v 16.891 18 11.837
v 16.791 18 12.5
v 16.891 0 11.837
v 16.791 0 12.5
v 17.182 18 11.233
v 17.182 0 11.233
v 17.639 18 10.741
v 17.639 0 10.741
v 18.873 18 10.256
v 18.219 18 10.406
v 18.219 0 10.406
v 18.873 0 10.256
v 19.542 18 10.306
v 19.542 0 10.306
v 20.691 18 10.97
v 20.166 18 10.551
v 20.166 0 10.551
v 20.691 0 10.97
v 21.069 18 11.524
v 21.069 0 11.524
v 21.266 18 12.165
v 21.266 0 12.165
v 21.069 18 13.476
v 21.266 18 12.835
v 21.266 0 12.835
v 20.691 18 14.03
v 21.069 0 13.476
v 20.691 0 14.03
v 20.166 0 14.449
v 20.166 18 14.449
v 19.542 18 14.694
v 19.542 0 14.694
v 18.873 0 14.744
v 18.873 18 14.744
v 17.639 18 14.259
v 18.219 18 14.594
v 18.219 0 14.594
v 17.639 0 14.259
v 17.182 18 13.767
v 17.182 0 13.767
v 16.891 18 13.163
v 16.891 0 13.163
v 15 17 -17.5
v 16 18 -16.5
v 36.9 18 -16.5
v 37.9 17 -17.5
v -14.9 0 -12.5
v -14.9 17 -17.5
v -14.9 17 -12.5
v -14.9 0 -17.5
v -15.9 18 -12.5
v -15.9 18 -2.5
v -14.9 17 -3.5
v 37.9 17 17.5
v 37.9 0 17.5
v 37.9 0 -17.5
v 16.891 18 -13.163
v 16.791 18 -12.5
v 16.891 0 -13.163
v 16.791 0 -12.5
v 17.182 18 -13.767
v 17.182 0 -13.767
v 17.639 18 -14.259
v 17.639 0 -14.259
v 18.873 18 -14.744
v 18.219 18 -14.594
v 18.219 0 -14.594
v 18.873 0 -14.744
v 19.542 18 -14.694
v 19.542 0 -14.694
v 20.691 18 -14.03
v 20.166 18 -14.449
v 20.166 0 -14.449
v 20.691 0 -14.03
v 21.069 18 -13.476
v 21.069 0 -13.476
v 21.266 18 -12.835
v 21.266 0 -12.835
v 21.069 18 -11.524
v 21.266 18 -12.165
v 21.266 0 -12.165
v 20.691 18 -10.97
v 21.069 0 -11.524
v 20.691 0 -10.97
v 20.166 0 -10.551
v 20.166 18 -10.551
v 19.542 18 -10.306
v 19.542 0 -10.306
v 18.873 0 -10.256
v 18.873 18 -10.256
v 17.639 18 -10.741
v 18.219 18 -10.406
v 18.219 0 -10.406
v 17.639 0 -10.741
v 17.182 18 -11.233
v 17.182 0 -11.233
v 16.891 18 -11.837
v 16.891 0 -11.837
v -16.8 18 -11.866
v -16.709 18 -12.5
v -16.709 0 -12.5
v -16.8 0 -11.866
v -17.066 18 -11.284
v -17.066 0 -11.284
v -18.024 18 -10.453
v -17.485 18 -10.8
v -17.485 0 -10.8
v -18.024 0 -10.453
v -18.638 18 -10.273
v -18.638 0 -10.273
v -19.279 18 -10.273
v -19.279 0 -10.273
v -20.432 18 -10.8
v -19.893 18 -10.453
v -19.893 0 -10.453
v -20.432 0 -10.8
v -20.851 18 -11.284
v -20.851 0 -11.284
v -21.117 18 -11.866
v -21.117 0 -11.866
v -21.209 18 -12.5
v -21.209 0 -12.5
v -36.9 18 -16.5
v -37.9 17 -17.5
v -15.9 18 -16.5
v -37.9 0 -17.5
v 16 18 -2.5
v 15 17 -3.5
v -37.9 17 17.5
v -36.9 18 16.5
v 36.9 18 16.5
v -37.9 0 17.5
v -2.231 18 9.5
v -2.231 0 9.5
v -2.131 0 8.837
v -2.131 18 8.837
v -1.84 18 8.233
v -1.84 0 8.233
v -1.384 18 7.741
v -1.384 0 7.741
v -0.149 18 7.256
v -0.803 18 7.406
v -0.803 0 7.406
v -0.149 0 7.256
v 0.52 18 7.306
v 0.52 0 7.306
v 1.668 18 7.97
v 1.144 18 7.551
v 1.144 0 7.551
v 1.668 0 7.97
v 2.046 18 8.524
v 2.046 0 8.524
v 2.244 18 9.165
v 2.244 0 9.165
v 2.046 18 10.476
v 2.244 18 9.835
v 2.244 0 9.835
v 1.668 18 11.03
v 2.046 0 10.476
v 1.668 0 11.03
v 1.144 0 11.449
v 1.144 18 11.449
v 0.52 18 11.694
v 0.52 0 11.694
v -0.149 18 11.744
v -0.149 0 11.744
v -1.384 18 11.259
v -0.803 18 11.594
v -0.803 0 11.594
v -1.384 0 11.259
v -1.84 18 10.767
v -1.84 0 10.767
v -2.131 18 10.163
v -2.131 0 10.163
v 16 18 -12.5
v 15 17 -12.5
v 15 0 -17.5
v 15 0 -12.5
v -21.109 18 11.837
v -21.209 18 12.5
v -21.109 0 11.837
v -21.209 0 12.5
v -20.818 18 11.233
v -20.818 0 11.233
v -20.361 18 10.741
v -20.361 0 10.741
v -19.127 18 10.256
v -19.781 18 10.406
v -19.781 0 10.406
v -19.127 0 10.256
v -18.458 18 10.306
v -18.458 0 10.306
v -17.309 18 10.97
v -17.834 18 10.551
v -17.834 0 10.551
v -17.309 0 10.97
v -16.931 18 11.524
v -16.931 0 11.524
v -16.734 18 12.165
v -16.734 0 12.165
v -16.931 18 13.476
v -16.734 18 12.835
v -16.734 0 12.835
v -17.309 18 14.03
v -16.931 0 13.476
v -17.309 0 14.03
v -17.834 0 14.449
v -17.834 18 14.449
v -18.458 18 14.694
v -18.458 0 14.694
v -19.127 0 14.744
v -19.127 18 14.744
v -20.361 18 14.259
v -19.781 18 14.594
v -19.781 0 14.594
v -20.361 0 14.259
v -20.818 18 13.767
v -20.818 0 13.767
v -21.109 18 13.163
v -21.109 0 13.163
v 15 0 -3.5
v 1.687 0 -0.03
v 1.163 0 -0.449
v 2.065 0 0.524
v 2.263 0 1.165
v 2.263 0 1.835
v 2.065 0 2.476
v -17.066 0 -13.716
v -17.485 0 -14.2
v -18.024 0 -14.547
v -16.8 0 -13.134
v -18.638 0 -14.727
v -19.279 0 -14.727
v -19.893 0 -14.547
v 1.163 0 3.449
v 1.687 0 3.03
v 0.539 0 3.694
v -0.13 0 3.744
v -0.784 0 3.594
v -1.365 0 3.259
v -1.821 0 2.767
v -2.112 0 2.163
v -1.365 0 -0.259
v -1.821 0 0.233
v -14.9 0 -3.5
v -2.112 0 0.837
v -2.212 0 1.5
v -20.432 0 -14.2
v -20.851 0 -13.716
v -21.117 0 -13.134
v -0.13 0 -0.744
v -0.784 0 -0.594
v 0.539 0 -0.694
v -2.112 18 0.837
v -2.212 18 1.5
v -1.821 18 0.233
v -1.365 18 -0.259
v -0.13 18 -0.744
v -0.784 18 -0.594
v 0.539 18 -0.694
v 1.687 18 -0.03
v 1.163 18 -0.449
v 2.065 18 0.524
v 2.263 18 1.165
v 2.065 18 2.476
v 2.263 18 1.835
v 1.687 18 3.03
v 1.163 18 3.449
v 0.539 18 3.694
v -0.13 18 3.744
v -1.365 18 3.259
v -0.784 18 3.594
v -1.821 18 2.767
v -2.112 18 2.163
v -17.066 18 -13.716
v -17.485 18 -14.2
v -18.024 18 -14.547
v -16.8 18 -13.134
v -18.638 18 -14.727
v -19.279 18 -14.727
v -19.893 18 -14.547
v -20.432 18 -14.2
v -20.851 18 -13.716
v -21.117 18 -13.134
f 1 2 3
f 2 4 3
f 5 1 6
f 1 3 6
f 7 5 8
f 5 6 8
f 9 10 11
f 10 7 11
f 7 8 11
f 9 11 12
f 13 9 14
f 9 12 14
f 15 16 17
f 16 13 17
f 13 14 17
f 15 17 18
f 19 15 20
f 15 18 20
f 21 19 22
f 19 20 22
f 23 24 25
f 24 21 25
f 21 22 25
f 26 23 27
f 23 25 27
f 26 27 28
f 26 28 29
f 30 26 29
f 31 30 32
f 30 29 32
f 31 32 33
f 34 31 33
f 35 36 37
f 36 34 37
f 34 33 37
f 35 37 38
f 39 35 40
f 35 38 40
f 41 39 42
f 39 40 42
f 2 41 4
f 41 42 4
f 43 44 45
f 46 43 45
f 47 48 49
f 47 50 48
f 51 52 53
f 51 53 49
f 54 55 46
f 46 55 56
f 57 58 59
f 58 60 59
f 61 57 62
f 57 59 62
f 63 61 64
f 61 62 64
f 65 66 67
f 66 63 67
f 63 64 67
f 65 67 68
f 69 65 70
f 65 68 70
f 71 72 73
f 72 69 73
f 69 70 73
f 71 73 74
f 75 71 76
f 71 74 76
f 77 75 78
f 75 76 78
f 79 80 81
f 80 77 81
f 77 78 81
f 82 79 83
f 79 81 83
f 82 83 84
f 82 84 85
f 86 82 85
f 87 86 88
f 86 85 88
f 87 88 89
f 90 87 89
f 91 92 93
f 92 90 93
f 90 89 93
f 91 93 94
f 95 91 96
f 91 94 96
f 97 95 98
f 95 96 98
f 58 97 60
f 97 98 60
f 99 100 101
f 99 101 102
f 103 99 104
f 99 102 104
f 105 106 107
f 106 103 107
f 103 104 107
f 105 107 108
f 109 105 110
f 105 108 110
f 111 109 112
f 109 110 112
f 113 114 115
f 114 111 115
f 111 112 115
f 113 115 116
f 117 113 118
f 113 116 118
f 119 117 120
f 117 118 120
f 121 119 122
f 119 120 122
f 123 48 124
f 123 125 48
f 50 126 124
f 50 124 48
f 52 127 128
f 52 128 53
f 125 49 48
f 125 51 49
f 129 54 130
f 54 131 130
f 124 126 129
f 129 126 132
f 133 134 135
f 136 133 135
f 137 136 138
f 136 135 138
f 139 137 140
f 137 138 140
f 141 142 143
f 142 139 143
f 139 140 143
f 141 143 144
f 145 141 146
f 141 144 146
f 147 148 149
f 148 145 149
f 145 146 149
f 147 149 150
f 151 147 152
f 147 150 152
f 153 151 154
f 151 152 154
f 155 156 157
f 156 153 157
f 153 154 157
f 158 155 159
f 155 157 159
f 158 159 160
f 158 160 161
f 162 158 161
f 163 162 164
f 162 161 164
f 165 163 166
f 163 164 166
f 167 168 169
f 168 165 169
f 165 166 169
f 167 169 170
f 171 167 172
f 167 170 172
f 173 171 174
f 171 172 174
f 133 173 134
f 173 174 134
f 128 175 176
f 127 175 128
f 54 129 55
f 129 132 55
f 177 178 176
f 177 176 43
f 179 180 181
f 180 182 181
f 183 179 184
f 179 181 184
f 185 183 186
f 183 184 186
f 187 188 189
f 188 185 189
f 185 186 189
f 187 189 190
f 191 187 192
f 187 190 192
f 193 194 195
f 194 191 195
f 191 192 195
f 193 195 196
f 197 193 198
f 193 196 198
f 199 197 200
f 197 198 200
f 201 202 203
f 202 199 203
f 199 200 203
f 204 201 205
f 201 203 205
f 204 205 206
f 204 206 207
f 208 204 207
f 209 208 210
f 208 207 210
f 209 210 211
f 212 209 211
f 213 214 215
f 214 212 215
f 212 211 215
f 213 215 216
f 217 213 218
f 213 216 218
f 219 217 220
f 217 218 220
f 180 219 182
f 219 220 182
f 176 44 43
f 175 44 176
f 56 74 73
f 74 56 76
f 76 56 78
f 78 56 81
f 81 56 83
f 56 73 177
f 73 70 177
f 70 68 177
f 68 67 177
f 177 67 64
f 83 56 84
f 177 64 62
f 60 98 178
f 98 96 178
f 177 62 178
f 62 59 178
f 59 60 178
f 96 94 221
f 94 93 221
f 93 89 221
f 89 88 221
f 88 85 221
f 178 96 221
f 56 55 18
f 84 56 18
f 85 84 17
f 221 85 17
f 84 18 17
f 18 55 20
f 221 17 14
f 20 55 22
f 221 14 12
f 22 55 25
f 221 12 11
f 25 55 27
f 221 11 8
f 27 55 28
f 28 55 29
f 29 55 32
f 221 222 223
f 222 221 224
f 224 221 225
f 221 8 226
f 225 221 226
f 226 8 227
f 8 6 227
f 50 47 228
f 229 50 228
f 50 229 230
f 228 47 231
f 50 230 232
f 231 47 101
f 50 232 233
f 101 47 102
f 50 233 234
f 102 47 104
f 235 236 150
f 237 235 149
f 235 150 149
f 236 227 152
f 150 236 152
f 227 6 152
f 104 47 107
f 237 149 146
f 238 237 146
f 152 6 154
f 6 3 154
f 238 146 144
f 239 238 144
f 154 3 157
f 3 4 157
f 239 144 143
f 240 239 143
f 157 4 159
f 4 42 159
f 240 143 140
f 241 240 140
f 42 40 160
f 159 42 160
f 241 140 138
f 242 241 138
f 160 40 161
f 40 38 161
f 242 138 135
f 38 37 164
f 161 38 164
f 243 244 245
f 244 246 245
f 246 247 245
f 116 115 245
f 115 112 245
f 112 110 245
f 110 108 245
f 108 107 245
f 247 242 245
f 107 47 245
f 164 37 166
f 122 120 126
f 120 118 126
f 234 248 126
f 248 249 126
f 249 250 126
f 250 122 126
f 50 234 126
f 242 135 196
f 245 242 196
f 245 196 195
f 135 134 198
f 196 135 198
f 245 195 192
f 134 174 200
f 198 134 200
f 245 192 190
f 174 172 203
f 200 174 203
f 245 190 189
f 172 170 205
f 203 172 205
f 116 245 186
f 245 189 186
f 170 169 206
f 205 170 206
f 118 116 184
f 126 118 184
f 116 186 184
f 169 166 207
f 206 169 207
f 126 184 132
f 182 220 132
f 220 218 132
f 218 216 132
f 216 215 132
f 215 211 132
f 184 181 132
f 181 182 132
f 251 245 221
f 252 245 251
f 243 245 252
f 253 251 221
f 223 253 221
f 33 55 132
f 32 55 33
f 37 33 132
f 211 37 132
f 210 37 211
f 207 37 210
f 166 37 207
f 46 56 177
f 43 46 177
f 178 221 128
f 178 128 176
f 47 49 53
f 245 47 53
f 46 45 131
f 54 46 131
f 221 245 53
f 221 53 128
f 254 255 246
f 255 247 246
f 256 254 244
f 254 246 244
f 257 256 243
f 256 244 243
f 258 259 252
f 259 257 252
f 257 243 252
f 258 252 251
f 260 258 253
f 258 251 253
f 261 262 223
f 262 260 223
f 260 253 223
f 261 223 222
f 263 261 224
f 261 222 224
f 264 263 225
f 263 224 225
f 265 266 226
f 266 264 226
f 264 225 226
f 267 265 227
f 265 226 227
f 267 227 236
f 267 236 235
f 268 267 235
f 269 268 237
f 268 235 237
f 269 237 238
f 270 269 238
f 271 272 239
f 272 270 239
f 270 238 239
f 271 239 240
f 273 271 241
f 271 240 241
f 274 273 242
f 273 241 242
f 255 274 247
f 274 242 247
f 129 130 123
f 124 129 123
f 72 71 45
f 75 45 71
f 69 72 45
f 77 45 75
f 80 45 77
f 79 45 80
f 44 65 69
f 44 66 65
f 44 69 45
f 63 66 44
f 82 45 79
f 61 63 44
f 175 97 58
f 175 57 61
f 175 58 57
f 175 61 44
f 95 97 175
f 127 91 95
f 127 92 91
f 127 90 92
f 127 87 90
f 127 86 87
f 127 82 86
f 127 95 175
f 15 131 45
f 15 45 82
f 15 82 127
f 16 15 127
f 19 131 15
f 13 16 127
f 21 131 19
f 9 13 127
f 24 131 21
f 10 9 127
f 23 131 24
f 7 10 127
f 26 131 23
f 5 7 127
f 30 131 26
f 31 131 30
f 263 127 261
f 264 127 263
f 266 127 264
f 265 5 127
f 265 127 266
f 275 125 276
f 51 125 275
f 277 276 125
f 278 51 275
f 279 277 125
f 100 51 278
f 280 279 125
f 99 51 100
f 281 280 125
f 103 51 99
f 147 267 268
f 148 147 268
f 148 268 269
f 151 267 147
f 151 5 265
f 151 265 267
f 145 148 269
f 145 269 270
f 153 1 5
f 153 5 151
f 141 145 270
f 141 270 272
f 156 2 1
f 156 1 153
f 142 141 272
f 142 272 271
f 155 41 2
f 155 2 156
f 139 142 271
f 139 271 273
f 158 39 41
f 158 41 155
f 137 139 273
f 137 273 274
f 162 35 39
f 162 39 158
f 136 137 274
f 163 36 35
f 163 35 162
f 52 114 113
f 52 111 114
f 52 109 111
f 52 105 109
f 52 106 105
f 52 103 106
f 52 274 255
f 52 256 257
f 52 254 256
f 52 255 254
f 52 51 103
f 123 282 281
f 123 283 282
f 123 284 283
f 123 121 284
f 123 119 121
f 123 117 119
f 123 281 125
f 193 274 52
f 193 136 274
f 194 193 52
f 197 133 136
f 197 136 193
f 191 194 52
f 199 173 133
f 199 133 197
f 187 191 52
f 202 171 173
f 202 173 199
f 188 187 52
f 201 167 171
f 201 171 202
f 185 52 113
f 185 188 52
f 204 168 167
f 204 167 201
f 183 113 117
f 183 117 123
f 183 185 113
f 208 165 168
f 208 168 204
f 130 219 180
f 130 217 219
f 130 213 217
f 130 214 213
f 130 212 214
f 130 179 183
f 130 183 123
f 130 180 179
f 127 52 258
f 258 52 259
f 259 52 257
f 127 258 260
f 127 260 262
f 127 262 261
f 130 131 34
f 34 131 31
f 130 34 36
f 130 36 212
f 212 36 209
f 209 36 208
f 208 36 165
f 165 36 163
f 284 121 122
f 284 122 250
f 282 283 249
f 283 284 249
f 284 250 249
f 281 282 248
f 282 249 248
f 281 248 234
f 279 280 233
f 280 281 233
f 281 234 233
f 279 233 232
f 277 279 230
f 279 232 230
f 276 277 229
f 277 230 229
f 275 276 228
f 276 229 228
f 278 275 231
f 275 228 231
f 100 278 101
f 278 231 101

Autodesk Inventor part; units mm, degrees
ref_plane "YZ Plane" through (0, 0, 0) normal (1, 0, 0) x (0, 1, 0)
ref_plane "XZ Plane" through (0, 0, 0) normal (0, 1, 0) x (-1, 0, 0)
ref_plane "XY Plane" through (0, 0, 0) normal (0, 0, 1) x (1, 0, 0)
sketch "Sketch1" plane through (0, 0, 0) normal (0, 1, 0) x (-1, 0, 0)
  line L0 (37.9, -17.5) -> (37.9, 17.5)
  line L1 (37.9, 17.5) -> (-37.9, 17.5)
  line L2 (-37.9, 17.5) -> (-37.9, -17.5)
  line L3 (37.9, -17.5) -> (14.9, -17.5)
  line L4 (14.9, -17.5) -> (14.9, -3.5)
  line L5 (14.9, -3.5) -> (-15, -3.5)
  line L6 (-15, -3.5) -> (-15, -17.5)
  line L7 (-37.9, -17.5) -> (-15, -17.5)
  line L8 (14.9, -17.5) -> (37.9, -17.5)
  circle A0 centre (-0.019, 9.5) radius 2.25
  circle A1 centre (-0.0381, 1.5) radius 2.25
  circle A2 centre (18.9586, -12.5) radius 2.25
  circle A3 centre (-19.0414, -12.5) radius 2.25
  circle A4 centre (-19.0414, 12.5) radius 2.25
  circle A5 centre (18.9586, 12.5) radius 2.25
  line L9 (18.9586, -12.5) -> (-19.0414, -12.5)
  line L10 (5.1, -12.5) -> (-13.9, -12.5)
  point P0 (0, 0)
  dimension "d0" = 75.8
  dimension "d1" = 35
  dimension "d2" = 23
  dimension "d3" = 14
  dimension "d4" = 29.9
  dimension "d7" = 4.5
  dimension "d8" = 4.5
  dimension "d11" = 4.5
  dimension "d12" = 4.5
  dimension "d20" = 38
  dimension "d21" = 0
  dimension "d23" = 38
extrude "Extrusion1" add sketch "Sketch1" along normal blind 18 contours L3 L4 L5 L6 L7 L2 L1 L0
chamfer "Chamfer1" distance 1 angle 45 8 edges at (-37.9, 18, 0) (0, 18, 17.5) (37.9, 18, 0) (-26.4, 18, -17.5) (26.45, 18, -17.5) (-14.9, 18, -10.5) (0.05, 18, -3.5) (15, 18, -10.5)
properties part number "GROUNDPLATE PART 1" material "Steel ASTM A36"
